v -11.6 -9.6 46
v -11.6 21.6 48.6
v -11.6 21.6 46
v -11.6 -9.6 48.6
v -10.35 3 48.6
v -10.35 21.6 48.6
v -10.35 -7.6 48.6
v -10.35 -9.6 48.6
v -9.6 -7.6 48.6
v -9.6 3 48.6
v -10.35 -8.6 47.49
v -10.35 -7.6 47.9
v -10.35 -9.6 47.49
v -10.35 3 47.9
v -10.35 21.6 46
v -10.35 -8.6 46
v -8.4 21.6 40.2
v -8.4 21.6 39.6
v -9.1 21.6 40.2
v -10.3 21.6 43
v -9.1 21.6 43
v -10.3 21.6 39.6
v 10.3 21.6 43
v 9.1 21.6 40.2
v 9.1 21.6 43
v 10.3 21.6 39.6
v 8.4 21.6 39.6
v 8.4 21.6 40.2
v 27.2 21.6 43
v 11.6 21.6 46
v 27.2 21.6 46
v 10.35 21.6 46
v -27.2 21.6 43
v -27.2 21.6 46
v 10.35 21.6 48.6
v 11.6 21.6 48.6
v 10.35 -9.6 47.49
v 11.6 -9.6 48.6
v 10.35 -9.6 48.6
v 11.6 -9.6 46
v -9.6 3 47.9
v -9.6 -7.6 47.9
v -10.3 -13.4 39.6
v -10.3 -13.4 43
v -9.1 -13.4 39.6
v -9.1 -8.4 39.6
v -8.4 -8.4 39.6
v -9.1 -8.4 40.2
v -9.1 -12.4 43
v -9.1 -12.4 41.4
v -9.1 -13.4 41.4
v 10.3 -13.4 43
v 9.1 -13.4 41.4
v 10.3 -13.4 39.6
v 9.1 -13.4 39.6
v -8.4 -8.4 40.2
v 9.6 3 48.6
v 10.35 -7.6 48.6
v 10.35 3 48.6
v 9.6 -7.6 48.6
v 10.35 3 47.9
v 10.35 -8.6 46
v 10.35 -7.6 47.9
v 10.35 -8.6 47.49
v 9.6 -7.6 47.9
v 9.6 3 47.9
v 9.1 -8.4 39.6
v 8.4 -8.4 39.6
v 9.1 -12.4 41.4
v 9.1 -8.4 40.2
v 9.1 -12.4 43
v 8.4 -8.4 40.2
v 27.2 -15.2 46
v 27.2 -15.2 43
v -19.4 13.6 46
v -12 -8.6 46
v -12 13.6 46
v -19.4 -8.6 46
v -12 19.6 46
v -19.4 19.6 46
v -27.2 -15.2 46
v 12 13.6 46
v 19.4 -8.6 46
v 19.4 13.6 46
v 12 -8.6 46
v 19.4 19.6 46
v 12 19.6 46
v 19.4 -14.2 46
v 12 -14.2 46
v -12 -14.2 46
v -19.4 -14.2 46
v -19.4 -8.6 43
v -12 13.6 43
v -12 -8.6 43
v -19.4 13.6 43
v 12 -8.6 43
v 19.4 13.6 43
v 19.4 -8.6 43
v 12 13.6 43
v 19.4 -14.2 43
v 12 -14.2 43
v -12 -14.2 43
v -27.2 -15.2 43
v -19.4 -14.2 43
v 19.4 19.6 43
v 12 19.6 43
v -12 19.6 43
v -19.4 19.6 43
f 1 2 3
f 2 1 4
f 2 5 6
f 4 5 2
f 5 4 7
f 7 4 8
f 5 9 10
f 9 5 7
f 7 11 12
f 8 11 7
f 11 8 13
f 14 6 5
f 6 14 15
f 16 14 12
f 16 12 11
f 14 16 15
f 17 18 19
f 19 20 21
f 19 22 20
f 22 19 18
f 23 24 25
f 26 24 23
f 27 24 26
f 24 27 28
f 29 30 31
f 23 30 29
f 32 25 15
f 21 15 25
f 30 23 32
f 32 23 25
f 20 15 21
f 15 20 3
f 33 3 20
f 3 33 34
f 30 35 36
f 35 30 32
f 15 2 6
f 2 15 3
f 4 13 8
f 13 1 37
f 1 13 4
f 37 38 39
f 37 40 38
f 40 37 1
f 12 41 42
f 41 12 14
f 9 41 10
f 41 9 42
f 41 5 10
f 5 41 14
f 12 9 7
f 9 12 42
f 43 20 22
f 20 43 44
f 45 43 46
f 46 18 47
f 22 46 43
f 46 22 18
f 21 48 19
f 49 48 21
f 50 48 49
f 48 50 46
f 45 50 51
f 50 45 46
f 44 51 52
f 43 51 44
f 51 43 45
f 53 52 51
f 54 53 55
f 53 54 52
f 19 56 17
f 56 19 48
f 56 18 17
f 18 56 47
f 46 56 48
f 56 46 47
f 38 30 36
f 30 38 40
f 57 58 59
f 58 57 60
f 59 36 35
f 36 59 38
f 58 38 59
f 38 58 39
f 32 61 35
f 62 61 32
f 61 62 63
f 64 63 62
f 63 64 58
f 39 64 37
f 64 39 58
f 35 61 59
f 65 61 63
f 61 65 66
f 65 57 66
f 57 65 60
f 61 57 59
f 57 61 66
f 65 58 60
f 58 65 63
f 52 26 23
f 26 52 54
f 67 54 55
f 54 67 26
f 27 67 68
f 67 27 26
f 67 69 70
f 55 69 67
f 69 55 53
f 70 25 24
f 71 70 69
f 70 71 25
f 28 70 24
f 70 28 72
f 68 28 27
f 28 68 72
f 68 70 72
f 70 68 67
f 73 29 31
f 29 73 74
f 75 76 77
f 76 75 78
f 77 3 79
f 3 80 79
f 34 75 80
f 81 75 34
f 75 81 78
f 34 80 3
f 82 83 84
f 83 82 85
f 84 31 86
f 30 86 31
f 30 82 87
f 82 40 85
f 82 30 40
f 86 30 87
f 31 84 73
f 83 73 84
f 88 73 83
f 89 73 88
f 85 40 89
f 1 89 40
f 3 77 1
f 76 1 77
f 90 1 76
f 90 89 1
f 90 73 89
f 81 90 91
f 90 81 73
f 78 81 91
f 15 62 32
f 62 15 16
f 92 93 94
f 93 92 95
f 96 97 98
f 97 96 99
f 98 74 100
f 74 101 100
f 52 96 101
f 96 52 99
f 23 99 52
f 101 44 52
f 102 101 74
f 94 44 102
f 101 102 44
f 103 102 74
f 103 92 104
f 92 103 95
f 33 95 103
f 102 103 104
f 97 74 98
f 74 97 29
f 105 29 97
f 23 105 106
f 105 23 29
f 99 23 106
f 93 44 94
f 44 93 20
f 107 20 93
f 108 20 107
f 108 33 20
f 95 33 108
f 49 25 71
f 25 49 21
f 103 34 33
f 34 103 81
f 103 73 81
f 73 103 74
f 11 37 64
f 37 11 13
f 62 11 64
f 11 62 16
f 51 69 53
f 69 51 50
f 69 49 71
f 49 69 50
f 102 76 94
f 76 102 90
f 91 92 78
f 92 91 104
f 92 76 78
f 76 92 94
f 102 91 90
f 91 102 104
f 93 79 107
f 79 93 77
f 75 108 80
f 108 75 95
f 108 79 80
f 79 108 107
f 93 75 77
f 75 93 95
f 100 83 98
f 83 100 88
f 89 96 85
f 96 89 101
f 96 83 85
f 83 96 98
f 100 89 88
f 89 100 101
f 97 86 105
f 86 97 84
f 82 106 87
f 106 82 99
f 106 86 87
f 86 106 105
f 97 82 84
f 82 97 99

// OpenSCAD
// file: ../config.scad
// Sparky - shared parameters and the module interface spec.
// All dimensions in mm. Origin: centre line of the body, on the table.
// +X = right, +Y = back, -Y = front (screen side), +Z = up.
//
// Values marked (measure) are estimates; measure your parts and edit here.

$fn = 48;

// ---------- Interface (keep fixed so modules stay swappable) ----------
outer_w   = 64.4;    // shell, collar and base footprint
outer_y0  = -30;     // front face of the shell
outer_y1  = 26.6;    // back face of the shell
outer_d   = outer_y1 - outer_y0;          // 56.6
outer_cy  = (outer_y0 + outer_y1) / 2;    // footprint centre (Y)
corner_r  = 8;       // outer corner radius of shell, collar and base
wall      = 2;       // shell wall
in_r      = corner_r - wall;              // 6, inside radius of the shell
clear     = 0.3;     // fit clearance between printed parts

feet_h    = 2;       // base feet
base_top  = 7;       // top of the base = underside of the rack
collar_h  = 4;
shell_z0  = base_top + collar_h;          // 11, bottom of the shell
shell_z1  = 76;      // top of the shell

// Magnets: 6 x 3 mm neodymium discs, all N faces pointing up.
mag_d     = 6.2;     // pocket diameter (magnet 6.0)
mag_h     = 3.2;     // pocket depth (magnet 3.0)
boss_d    = 9;

mag_base_rack  = [[-24,-15],[24,-15],[-24,16],[24,16]];   // base top <-> rack floor
mag_rack_shell = [[-23,-15],[23,-15],[-23,17],[23,17]];   // rack towers <-> shell ceiling
pin_hole  = 1.95;    // locating pins: short pieces of 1.75 mm filament
pin_depth = 3;
collar_pins = [[-15, 24.25], [15, 24.25]];   // base <-> collar
face_pins   = [[-24, -23.5], [24, -23.5]];   // rack floor <-> face frame

// ---------- Rack (the body every part slides into) ----------
rack_xo   = 29.8;    // outside of the side walls
rack_t    = 2.4;     // side wall thickness
rack_xi   = rack_xo - rack_t;            // 27.4
rack_yf   = -27.6;   // front of the face frame
rack_yb   = 21.6;    // back of the rack (open)
rack_cf   = 5.5;     // 45 deg front corner chamfer (clears the shell's inside radius, prints face-down)
rack_rb   = 3.5;     // back corner radius
floor_z   = base_top;                    // 7
floor_t   = 4.4;
in_z      = floor_z + floor_t;           // 11.4, top of the floor
rack_top  = 68.4;    // top of the walls = underside of the lid
lid_t     = 4;
lid_top   = rack_top + lid_t;            // 72.4

tower_x   = 17.2;    // inner face of the two top towers (lid fits between)
tower_z0  = rack_top - 2;                // underside of the towers
chamfer   = 3;       // 45 deg chamfer on the towers' outer top edges

// LiPo side bays: a rib on each side, the bay is between rib and wall
rib_x     = 19.6;    // inner face of the rib
rib_t     = 1.6;
bay_z1    = 41.8;    // top of the ribs

// Middle plate (slide 2): MPU-6050 on top, amp hanging underneath
plate_z0  = 43;
plate_t   = 3;
plate_z1  = plate_z0 + plate_t;          // 46
plate_y0  = -15.2;
plate_w   = 2*rack_xi - 0.4;
hole_x    = [12, 19.4];                  // wire holes in the plate corners (|x|)
hole_yf   = [-14.2, -8.6];
hole_yb   = [13.6, 19.6];
ledge     = 1.2;                         // plate ledges on the walls

// Board slide (slide 1)
board     = [28, 34.6, 1.6];             // expansion board (measure)
board_y0  = -12.6;
board_z   = in_z + 1;                    // board rests on two ledges

// Face frame (display + speaker), drops onto the floor in front of the walls
face_yb   = -19.4;   // back of the face frame = front of the side walls
face_t    = 2;       // front plate
flange_t  = 2;       // bottom flange the speaker stands on

// ---------- Components (measure) ----------
oled      = [35.4, 1.4, 33.4];           // 1.3" OLED PCB, landscape, pins on top
glass     = [34.5, 1.4, 23];
glass_up  = 6;       // glass bottom above the PCB bottom
speaker   = [40, 4.8, 20];               // 2040 speaker standing on edge
spk_z0    = in_z + flange_t;             // 13.4
ledge_z0  = spk_z0 + speaker[2] + 0.2;   // 33.6, display shelf
oled_z0   = ledge_z0 + 1;                // 34.6
mpu       = [20.3, 15.6, 1.6];           // GY-521
amp       = [17.8, 19.3, 1.6];           // MAX98357A
mic_d     = 14;                          // INMP441, round
mic_xy    = [-2, -2.5];
touch     = [15, 11];                    // TTP223
battery   = [5, 40, 30];                 // LiPo 503040 on edge

// Shell openings
win_w     = 31;      // display window (active area 29.4 x 14.7)
win_z     = [oled_z0 + glass_up + 3, oled_z0 + glass_up + 20];
grille_z  = [15.4, 31.4];
usb       = [12.4, 21.3, 28.1];          // width, z0, z1
mic_hole  = 1.4;

// ---------- Helpers ----------
module rrect2d(w, d, r) { offset(r) square([w - 2*r, d - 2*r], center = true); }
module rrect(w, d, r, h) { linear_extrude(h) rrect2d(w, d, r); }
module rbox(w, d, h, r) {      // box with every edge rounded, z from 0 to h
  hull() for (x = [-1,1], y = [-1,1], z = [r, h - r])
    translate([x*(w/2 - r), y*(d/2 - r), z]) sphere(r);
}
module mag_pocket(z) { translate([0,0,z]) cylinder(d = mag_d, h = mag_h); }
module pin_hole_at(z, h = pin_depth) translate([0,0,z]) cylinder(d = pin_hole, h = h, $fn = 16);

// Plan outline of the rack (and the collar opening)
module rack_2d(grow = 0) {
  offset(delta = grow) hull() {
    polygon([[-rack_xo + rack_cf, rack_yf], [rack_xo - rack_cf, rack_yf], [rack_xo, rack_yf + rack_cf], [-rack_xo, rack_yf + rack_cf]]);
    for (s = [-1, 1]) translate([s*(rack_xo - rack_rb), rack_yb - rack_rb]) circle(rack_rb);
  }
}
// Outer footprint (shell, collar, base)
module outer_2d() translate([0, outer_cy]) rrect2d(outer_w, outer_d, corner_r);

// A profile in the X-Z plane, extruded along Y from y0 to y1.
module along_y(y0, y1) translate([0, y1, 0]) rotate([90, 0, 0]) linear_extrude(y1 - y0) children();
// A profile in the Y-Z plane, extruded along X from x0 to x1.
module along_x(x0, x1) translate([x0, 0, 0]) rotate([90, 0, 90]) linear_extrude(x1 - x0) children();
// main file
// Middle plate (slide 2): a solid plate that slides into the wall ledges.
// The MPU-6050 slides into a groove on top, the MAX98357A amp slides into a
// groove underneath (parts down, terminal at the back). Four corner holes
// pass the wires down to the board.
// Prints standing on its back edge: every rail and lip then grows straight up.
include <../config.scad>

module plate() {
  hw = plate_w/2;
  mx = mpu[0]/2 + 0.2;                 // MPU groove half-width
  ax = amp[0]/2 + 0.2;                 // amp groove half-width
  my0 = -8.6;                          // MPU front edge
  ay0 = -12.4;                         // amp front edge
  gap = 1.2;                           // air under the plate for the amp's solder joints
  ab  = plate_z0 - gap - amp[2];       // underside of the amp
  difference() {
    union() {
      translate([-hw, plate_y0, plate_z0]) cube([plate_w, rack_yb - plate_y0, plate_t]);
      for (s = [-1, 1]) mirror([s < 0 ? 1 : 0, 0, 0]) {
        // MPU groove on top: rail + lip
        translate([mx, my0 - 1, plate_z1 - 0.01]) cube([1.25, rack_yb - my0 + 1, mpu[2] + 1.01]);
        translate([mpu[0]/2 - 0.55, my0 + 1, plate_z1 + mpu[2] + 0.3]) cube([mx + 0.01 - (mpu[0]/2 - 0.55), mpu[1] - 5, 0.7]);
        // amp groove underneath: hanger + lip
        translate([ax, ay0 - 1, ab - 0.6]) cube([1.2, rack_yb - ay0 + 1, plate_z0 - ab + 0.61]);
        translate([amp[0]/2 - 0.5, ay0 + 4, ab - 0.6]) cube([ax + 0.01 - (amp[0]/2 - 0.5), rack_yb - ay0 - 4, 0.6]);
      }
      // front stops
      translate([-mx - 1.25, my0 - 1, plate_z1 - 0.01]) cube([2*mx + 2.5, 1, 1.5]);
      translate([-ax - 1.2, ay0 - 1, plate_z0 - 1.6]) cube([2*ax + 2.4, 1, 1.61]);
    }
    // wire holes
    for (s = [-1, 1], hy = [hole_yf, hole_yb])
      translate([s < 0 ? -hole_x[1] : hole_x[0], hy[0], plate_z0 - 1]) cube([hole_x[1] - hole_x[0], hy[1] - hy[0], plate_t + 2]);
  }
}

plate();
